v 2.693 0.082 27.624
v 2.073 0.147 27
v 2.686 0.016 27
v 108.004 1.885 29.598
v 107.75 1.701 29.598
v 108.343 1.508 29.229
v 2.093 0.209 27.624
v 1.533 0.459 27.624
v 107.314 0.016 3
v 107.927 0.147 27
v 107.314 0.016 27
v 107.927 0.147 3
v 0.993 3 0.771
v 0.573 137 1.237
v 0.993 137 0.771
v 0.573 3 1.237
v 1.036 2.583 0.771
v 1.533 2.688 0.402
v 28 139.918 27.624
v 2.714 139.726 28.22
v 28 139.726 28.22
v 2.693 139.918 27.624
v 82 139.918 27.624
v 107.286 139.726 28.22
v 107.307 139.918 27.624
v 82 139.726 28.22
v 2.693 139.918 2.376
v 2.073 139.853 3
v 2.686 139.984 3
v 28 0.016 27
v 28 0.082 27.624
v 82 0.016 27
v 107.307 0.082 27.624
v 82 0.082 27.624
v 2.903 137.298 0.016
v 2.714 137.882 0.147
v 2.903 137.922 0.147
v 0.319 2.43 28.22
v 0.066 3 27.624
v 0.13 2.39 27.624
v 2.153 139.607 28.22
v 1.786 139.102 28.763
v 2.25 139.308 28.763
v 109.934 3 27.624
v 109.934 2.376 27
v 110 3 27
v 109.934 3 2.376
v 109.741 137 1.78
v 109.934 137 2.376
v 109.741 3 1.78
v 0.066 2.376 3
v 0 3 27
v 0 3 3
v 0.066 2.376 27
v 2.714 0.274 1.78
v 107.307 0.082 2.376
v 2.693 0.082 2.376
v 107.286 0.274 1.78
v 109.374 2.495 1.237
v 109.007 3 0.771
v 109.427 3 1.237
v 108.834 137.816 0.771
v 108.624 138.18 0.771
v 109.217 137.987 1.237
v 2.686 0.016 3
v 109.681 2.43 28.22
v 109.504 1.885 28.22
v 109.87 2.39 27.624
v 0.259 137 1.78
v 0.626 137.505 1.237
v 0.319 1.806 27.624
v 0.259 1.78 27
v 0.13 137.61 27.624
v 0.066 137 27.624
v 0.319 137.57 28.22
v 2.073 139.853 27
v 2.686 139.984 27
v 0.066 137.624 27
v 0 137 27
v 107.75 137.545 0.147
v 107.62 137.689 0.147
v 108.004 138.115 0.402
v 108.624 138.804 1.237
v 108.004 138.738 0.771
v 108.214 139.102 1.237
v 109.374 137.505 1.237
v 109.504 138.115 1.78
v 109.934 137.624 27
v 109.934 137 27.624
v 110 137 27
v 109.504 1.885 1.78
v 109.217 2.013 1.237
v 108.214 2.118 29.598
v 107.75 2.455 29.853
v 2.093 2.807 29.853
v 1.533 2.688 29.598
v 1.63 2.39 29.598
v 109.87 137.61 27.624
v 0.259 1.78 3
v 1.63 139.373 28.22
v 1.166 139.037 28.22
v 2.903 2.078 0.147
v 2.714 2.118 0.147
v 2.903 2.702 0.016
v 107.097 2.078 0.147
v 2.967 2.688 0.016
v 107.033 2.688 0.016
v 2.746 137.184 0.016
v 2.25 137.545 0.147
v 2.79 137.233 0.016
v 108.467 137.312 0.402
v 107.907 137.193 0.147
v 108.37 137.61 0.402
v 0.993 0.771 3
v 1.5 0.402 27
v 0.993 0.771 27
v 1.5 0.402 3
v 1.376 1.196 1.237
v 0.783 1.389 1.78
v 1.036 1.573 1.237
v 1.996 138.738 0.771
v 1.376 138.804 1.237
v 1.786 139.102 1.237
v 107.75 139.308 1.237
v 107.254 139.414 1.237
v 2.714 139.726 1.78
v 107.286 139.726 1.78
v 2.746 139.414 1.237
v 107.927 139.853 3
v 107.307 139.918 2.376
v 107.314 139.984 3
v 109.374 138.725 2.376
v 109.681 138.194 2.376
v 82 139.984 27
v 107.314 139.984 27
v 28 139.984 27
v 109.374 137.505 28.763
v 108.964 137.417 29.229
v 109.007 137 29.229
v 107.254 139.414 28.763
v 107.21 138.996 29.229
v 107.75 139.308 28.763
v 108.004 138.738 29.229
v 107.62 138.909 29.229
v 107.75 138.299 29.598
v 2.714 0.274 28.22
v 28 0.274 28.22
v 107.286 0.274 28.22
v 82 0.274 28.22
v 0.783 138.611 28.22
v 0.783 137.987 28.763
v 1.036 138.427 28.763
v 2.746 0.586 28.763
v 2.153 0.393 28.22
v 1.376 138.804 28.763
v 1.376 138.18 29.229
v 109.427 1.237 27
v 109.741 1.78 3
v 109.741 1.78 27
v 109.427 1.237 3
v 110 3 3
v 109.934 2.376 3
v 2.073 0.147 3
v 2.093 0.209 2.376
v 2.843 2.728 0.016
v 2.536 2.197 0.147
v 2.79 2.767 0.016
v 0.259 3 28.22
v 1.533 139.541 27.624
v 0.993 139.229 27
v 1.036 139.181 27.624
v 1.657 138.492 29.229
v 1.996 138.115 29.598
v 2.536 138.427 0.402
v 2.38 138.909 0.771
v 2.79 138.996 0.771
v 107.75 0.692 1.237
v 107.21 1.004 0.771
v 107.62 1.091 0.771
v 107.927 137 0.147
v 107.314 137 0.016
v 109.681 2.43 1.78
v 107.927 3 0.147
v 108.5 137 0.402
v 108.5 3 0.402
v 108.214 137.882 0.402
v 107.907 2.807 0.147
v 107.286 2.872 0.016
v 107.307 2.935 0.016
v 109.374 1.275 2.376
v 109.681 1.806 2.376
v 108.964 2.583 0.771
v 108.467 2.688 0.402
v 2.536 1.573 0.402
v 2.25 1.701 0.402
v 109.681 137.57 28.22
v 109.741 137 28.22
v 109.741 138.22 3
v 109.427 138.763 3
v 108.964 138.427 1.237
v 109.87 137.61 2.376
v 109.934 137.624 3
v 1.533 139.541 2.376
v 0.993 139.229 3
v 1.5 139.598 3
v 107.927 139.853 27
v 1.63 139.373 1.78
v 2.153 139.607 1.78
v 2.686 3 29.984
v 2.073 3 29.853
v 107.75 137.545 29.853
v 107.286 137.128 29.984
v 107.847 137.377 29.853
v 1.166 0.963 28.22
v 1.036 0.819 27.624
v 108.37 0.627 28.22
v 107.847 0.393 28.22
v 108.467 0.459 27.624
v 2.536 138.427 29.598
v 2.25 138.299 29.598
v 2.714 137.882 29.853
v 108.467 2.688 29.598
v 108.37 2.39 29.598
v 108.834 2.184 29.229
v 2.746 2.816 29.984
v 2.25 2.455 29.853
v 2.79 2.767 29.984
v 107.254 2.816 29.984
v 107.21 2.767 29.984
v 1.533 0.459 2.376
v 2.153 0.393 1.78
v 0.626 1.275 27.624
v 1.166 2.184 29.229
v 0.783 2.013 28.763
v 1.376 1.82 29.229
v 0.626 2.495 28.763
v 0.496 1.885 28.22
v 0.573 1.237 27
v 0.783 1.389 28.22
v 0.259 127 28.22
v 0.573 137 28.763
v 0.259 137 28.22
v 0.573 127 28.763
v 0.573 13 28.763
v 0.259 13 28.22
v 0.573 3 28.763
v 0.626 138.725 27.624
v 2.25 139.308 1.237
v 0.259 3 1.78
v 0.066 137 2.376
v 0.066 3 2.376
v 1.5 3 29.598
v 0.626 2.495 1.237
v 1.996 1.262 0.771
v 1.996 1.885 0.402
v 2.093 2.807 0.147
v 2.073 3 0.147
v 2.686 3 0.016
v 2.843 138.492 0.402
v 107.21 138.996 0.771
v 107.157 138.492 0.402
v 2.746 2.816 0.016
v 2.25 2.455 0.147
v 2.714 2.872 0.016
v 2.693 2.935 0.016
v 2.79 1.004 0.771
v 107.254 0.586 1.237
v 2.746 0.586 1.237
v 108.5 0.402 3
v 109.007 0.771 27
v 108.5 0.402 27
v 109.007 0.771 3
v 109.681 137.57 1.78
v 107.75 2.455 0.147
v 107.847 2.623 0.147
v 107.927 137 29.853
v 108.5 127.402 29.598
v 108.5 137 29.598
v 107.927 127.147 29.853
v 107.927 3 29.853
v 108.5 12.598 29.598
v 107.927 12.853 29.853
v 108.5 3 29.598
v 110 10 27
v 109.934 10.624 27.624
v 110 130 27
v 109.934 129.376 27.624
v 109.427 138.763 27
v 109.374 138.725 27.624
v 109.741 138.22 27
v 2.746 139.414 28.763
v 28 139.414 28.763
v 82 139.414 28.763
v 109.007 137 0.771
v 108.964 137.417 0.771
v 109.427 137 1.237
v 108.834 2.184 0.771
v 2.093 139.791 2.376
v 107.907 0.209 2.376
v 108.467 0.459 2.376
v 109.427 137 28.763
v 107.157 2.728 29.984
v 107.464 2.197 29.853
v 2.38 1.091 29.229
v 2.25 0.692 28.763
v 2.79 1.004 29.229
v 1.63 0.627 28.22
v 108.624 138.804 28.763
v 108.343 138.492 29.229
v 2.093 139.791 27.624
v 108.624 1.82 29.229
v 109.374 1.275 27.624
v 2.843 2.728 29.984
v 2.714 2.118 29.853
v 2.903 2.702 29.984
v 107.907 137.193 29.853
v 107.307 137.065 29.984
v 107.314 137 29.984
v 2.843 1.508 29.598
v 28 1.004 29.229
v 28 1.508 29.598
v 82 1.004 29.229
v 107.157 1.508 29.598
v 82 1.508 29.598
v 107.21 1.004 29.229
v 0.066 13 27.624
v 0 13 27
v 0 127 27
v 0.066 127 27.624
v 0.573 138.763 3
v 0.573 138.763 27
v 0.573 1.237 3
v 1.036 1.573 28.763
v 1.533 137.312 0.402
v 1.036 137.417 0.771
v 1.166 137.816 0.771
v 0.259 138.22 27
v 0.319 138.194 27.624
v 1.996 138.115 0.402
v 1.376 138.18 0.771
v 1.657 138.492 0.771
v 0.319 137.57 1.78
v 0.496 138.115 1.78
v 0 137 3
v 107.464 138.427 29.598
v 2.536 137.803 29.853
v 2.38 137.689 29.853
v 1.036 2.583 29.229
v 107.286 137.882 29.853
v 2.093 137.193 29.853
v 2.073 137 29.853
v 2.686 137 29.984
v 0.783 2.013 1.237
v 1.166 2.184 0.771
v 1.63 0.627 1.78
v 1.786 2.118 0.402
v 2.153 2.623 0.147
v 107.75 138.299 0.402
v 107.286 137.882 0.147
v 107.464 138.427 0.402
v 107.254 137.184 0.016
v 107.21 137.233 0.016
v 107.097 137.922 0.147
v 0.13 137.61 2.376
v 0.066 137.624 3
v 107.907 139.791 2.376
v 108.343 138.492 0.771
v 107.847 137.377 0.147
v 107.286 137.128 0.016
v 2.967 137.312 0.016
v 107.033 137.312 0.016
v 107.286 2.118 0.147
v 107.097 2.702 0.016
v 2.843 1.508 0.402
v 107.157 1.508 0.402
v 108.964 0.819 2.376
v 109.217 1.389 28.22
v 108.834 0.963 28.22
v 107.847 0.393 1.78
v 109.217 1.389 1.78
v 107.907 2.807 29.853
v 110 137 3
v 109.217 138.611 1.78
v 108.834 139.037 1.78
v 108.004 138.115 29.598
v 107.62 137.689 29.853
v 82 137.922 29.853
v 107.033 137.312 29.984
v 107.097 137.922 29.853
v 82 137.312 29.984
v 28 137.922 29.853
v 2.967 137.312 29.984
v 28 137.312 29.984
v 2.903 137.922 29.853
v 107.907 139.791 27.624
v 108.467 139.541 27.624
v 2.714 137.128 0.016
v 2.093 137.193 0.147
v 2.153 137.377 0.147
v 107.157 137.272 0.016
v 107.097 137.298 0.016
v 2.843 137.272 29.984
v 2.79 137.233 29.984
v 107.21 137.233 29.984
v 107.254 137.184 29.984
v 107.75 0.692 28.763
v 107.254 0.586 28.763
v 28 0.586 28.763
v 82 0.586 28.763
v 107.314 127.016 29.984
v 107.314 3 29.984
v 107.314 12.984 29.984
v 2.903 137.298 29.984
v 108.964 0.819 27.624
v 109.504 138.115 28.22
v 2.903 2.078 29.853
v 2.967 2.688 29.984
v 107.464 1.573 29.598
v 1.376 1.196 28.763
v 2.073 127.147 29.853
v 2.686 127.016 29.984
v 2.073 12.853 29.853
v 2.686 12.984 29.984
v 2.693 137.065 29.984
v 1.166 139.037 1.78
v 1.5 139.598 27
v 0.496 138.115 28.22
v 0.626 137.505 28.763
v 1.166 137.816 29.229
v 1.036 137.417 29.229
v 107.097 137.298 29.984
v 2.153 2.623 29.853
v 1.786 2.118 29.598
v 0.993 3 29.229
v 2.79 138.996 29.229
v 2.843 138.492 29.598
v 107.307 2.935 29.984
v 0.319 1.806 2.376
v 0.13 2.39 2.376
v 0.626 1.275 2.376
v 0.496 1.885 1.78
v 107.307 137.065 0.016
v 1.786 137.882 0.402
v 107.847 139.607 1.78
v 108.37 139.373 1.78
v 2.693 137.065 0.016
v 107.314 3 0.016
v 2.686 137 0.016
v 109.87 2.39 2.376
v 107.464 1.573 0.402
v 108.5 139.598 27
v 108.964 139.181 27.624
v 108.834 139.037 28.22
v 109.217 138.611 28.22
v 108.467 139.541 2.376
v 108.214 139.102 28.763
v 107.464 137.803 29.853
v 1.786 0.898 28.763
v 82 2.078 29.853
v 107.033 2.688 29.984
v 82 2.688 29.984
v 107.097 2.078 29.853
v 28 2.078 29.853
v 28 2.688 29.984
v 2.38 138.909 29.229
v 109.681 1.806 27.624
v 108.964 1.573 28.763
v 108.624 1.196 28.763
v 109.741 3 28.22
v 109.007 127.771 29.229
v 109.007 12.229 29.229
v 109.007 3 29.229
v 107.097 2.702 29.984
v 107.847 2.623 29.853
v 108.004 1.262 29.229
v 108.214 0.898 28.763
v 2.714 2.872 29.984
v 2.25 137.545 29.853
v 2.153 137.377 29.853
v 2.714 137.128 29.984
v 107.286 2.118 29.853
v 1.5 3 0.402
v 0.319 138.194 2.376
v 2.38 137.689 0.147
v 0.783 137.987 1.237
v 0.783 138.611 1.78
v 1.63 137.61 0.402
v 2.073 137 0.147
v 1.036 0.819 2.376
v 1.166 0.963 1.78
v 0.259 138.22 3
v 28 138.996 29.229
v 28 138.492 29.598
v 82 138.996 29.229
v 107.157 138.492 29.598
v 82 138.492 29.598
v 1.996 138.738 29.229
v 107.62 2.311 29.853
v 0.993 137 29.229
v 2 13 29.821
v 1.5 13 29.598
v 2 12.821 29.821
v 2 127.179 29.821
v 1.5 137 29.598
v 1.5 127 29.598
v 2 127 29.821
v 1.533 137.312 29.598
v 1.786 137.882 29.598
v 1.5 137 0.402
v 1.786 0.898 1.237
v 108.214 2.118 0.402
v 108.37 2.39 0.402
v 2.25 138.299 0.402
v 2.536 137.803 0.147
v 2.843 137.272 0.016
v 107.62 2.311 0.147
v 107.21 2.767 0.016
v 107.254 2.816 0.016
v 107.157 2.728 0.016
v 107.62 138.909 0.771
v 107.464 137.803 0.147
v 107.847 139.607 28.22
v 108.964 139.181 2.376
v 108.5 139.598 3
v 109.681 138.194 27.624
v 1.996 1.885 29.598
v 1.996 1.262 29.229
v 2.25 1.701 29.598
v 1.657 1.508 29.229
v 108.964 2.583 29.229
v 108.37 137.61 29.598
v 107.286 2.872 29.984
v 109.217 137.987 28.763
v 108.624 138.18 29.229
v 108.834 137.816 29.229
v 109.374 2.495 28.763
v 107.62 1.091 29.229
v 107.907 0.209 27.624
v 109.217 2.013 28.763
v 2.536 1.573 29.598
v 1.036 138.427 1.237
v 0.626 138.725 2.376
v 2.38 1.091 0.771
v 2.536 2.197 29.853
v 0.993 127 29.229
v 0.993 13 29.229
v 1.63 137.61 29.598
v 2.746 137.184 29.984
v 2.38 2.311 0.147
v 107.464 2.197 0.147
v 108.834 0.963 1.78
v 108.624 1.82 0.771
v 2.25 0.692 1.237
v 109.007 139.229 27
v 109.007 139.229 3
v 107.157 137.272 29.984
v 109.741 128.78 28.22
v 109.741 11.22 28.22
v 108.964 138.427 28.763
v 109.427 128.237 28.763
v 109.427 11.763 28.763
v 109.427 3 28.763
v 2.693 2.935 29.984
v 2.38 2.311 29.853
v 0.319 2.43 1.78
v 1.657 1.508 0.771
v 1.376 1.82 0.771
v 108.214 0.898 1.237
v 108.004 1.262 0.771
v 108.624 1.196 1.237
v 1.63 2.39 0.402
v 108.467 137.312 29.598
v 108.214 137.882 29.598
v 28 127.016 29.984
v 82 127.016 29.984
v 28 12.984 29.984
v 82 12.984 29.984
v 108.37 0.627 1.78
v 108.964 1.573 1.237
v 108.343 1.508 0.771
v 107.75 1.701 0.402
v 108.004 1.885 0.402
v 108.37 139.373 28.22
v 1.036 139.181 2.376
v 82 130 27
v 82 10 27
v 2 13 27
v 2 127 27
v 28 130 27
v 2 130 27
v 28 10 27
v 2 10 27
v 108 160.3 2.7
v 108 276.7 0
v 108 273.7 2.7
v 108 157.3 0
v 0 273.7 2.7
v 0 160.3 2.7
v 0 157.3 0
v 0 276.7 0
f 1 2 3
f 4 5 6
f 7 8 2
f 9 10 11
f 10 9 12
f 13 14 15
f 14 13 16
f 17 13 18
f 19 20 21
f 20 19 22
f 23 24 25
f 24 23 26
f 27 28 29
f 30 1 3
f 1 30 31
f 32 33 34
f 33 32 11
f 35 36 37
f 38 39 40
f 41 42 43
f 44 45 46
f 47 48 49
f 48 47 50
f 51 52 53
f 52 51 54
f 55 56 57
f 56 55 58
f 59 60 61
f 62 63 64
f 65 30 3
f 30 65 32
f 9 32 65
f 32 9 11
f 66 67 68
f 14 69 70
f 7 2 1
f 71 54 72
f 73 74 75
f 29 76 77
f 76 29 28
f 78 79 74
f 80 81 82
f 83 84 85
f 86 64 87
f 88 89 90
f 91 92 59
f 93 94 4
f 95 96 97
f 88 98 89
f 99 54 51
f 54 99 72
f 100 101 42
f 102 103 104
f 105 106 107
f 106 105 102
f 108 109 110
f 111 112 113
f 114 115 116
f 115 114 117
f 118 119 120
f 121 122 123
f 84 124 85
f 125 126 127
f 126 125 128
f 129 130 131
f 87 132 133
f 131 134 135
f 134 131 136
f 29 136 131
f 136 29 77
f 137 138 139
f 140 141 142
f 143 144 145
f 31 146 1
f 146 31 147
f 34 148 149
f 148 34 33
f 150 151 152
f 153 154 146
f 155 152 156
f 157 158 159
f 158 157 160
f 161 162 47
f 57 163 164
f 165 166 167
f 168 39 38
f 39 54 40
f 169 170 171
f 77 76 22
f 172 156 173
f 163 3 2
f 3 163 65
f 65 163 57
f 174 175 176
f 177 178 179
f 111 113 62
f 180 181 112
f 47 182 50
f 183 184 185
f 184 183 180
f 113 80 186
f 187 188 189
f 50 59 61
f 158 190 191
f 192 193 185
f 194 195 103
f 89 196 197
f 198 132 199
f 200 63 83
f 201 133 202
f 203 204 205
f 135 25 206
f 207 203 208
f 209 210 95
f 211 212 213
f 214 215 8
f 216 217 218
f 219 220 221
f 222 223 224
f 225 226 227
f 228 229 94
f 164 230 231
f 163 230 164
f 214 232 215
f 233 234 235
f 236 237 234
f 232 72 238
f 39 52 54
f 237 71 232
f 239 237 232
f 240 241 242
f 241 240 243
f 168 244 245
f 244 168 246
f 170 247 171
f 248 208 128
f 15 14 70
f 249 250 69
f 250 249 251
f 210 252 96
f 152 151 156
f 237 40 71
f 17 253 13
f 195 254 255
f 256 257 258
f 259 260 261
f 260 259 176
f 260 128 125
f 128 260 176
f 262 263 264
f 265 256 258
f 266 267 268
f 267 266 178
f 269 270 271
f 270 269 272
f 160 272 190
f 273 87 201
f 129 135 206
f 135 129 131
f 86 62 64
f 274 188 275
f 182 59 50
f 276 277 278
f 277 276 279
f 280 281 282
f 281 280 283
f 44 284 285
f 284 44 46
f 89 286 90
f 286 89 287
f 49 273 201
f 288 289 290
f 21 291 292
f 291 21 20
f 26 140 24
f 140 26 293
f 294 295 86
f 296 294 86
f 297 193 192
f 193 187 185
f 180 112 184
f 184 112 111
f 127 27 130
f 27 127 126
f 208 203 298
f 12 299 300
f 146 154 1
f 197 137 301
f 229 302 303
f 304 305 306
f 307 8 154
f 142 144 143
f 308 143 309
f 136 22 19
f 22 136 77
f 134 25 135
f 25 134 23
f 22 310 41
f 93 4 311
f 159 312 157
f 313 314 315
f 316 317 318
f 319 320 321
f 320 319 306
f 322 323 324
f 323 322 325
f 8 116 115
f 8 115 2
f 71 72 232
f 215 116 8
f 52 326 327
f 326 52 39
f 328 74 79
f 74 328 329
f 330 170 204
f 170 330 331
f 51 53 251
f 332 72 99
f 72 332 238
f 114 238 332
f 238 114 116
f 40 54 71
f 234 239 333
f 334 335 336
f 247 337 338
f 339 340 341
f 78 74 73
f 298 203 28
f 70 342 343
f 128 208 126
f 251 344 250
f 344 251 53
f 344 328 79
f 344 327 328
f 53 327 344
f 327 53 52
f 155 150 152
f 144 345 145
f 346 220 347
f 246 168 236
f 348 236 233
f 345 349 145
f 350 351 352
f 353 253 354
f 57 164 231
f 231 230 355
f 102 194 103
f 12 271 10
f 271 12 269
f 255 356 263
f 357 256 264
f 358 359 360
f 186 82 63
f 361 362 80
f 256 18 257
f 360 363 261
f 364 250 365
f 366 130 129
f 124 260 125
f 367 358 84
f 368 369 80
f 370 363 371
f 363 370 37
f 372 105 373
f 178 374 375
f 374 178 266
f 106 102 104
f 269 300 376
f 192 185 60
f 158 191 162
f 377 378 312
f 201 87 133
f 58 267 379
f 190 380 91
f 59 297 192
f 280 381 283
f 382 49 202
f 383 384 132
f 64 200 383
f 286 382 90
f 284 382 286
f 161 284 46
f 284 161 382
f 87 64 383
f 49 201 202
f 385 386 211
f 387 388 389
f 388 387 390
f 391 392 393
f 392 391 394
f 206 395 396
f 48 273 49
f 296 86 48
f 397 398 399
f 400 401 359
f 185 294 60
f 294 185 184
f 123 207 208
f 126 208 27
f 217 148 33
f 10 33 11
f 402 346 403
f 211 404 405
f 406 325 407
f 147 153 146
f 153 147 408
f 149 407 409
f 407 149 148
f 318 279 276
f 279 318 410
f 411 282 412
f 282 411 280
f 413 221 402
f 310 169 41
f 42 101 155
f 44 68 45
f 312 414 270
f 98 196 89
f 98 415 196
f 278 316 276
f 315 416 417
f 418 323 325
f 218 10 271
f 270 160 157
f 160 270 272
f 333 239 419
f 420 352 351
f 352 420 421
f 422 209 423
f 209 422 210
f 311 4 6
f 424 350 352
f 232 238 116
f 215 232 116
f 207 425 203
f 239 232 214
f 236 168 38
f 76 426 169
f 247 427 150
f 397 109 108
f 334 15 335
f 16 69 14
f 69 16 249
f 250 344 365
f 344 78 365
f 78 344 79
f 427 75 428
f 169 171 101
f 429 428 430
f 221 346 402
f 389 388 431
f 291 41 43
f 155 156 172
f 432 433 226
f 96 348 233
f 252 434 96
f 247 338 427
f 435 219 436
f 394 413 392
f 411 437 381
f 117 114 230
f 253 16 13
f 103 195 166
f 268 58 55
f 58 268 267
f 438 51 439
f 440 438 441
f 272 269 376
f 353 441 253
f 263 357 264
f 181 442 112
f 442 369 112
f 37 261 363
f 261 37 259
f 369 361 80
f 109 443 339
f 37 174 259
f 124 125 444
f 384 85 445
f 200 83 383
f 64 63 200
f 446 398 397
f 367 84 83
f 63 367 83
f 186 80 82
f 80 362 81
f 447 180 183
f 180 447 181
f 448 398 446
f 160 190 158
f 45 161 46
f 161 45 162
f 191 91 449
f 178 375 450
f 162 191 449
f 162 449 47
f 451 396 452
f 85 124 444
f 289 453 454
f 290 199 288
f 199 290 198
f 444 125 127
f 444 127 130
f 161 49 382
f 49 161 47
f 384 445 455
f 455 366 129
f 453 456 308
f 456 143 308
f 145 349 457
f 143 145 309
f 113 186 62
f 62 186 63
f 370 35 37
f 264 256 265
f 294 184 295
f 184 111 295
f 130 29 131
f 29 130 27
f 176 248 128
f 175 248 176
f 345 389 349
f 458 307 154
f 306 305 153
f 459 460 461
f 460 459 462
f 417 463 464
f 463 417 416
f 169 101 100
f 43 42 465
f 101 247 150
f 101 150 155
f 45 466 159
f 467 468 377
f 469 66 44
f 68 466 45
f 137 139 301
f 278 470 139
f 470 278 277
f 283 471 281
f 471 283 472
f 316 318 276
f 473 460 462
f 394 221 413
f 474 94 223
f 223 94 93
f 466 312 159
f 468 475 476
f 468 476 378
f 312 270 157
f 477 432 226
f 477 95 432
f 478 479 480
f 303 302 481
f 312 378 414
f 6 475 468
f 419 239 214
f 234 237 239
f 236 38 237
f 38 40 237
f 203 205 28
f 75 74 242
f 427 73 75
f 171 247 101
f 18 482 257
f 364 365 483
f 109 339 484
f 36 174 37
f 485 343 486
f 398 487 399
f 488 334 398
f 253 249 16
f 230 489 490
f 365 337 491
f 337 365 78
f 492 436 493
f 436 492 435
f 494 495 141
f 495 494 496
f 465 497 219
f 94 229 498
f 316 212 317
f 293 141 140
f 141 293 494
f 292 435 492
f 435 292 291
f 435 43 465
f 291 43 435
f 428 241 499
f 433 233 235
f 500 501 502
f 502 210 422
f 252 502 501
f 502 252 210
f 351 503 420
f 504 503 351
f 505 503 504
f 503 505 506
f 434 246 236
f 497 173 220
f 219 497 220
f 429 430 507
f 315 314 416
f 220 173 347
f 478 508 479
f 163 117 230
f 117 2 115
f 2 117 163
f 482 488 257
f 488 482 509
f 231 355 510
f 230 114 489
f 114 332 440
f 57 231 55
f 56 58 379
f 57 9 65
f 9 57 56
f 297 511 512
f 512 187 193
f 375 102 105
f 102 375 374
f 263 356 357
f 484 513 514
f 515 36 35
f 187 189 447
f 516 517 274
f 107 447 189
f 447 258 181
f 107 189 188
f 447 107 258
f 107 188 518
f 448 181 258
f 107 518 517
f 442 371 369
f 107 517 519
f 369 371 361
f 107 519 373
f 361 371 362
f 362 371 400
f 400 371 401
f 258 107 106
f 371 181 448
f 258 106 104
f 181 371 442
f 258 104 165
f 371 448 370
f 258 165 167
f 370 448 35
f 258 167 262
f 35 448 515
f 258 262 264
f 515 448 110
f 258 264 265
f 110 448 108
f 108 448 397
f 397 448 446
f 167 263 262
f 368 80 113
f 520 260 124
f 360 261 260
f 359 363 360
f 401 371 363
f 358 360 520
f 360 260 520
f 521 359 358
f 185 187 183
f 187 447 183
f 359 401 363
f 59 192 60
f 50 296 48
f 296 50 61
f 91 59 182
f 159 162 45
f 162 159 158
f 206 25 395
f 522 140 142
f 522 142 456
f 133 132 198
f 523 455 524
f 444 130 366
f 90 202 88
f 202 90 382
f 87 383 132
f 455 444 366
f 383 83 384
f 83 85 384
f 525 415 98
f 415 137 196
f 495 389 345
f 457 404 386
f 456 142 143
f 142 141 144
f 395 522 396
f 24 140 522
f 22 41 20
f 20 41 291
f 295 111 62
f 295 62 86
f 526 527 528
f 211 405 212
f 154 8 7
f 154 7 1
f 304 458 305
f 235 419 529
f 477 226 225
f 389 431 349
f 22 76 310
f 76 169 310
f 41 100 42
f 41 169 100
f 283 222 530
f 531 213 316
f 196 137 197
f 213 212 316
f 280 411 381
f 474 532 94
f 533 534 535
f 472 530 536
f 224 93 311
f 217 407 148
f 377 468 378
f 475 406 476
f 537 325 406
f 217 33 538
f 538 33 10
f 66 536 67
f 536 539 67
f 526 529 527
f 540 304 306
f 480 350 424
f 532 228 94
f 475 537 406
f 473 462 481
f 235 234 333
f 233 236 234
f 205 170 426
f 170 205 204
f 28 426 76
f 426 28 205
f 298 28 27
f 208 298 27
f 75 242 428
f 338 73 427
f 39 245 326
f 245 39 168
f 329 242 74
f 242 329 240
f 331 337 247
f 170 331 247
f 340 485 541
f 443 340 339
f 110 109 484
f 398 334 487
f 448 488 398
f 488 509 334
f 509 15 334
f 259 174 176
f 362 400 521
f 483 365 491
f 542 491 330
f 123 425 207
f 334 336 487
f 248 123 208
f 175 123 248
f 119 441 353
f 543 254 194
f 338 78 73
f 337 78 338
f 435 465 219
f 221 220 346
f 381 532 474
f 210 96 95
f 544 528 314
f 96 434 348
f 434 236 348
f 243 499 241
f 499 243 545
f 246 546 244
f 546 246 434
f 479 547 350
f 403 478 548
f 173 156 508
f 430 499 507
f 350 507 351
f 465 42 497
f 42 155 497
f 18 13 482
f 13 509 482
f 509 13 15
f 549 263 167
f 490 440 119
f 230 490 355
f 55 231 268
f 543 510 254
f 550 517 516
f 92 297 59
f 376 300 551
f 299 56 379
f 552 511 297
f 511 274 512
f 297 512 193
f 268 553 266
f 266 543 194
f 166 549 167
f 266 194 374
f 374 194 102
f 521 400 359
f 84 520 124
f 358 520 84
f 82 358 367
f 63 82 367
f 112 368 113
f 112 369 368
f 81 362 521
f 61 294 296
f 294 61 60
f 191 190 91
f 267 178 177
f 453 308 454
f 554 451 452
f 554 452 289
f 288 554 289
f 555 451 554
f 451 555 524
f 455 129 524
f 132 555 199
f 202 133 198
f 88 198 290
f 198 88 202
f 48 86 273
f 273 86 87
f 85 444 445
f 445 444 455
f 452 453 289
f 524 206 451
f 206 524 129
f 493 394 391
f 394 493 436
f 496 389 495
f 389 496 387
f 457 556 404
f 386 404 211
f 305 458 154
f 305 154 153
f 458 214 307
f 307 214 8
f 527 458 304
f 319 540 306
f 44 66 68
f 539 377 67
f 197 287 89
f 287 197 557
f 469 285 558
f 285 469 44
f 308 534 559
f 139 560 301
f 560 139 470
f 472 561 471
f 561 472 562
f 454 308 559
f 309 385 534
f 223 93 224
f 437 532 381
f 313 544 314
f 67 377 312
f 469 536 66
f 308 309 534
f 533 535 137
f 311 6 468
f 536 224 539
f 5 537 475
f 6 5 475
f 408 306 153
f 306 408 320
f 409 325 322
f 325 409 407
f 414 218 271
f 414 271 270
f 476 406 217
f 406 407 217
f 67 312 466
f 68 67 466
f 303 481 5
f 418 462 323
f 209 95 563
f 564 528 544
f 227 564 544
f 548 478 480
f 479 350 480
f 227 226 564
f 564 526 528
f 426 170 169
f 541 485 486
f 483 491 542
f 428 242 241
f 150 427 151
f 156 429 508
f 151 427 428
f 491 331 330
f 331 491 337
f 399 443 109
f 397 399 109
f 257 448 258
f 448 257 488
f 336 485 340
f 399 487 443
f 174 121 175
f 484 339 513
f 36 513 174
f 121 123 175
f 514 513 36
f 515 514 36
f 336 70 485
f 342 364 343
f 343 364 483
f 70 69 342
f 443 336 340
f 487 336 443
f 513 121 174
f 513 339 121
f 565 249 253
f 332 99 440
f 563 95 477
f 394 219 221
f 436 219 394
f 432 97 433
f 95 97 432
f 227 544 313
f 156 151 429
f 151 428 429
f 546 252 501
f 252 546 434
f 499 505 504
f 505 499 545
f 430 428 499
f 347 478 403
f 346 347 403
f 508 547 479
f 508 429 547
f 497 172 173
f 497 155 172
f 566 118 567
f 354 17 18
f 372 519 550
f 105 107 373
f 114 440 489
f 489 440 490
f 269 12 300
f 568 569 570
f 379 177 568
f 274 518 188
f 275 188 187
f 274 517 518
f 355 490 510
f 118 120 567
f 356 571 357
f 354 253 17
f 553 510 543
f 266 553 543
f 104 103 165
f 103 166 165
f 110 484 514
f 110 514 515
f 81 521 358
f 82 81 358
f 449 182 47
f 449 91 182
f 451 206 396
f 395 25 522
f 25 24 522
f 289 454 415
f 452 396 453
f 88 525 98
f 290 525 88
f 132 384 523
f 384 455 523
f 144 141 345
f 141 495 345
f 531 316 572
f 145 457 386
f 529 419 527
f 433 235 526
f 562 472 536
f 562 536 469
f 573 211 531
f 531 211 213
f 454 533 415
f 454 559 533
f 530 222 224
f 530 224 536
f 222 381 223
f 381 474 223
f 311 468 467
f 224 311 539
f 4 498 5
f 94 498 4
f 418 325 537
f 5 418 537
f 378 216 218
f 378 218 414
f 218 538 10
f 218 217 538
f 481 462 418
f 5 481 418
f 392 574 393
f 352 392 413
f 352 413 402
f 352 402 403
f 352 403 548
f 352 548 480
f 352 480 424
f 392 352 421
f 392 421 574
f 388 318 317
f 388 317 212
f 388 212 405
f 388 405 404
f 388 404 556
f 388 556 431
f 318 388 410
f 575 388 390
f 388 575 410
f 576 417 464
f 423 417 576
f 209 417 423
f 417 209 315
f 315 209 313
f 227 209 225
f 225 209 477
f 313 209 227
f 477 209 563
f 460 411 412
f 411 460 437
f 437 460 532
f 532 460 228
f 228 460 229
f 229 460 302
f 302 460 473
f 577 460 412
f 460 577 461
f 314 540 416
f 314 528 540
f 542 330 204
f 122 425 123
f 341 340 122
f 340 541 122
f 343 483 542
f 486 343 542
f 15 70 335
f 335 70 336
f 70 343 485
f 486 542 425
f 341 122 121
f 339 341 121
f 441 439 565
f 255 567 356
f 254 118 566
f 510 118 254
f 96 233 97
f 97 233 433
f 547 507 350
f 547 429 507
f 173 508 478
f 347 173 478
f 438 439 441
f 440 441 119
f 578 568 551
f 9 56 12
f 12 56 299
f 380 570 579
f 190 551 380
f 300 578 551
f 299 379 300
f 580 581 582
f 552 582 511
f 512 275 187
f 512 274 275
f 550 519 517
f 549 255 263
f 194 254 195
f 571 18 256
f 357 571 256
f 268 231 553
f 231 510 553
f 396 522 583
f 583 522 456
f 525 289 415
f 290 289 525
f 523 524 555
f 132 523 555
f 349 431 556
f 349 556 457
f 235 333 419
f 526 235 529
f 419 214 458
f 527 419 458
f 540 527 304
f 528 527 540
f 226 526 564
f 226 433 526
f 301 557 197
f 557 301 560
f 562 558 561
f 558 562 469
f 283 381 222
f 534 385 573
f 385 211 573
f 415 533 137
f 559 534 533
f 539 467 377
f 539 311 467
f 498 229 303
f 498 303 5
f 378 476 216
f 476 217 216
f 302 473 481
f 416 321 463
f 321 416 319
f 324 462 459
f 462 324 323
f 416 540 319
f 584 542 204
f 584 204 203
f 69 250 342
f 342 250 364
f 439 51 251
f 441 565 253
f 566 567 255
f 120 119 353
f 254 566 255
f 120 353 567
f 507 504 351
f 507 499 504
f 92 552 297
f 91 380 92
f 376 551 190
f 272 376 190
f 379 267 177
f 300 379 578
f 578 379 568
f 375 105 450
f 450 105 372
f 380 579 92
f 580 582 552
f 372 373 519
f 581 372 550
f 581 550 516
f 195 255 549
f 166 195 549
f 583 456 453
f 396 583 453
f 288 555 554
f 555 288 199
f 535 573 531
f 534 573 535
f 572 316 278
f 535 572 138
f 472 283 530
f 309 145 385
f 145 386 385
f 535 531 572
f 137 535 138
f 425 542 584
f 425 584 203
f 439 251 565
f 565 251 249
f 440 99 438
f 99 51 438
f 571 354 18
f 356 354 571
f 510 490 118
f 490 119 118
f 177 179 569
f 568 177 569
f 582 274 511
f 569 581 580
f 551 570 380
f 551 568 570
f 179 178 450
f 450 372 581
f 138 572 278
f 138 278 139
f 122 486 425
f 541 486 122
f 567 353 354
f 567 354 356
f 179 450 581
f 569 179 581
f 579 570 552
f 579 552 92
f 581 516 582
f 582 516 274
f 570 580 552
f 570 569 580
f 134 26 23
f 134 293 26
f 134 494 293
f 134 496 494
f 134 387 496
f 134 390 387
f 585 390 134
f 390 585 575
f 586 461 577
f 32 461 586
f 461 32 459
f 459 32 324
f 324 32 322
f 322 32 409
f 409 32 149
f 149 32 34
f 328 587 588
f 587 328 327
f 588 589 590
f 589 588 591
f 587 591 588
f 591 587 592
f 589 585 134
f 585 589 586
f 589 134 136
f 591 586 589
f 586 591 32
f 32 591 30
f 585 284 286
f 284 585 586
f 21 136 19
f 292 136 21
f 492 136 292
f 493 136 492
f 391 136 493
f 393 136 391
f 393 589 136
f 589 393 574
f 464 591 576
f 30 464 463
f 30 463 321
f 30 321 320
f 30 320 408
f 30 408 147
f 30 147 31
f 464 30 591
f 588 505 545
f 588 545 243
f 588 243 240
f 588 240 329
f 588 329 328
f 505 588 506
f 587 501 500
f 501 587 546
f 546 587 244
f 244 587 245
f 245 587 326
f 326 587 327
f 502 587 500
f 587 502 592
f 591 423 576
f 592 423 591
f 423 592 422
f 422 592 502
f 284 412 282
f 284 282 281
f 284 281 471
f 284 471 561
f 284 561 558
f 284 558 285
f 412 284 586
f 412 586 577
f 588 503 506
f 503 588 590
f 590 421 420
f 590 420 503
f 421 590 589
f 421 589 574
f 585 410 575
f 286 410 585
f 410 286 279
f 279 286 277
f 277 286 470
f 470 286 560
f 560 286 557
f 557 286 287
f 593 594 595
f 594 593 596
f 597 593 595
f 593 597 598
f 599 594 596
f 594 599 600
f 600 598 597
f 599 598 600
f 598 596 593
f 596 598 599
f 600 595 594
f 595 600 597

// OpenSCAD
$fn = 30;

TL = 110;
TW = 140;
TH = 27;
LidH = 3;

WT = 2;

Tol =0.3;


module RCube(x,y,z,ipR=2, ipFlatTop = 0)
{
    hull(){
      translate([ipR,ipR,ipR]) sphere(ipR);
      translate([x-ipR,ipR,ipR]) sphere(ipR);
      translate([ipR,y-ipR,ipR]) sphere(ipR);
      translate([x-ipR,y-ipR,ipR]) sphere(ipR);
      if (ipFlatTop > 0)
        {
          translate([ipR,ipR,z-ipR]) cylinder(r=ipR,h=ipR);
          translate([x-ipR,ipR,z-ipR]) cylinder(r=ipR,h=ipR);
          translate([ipR,y-ipR,z-ipR]) cylinder(r=ipR,h=ipR);
          translate([x-ipR,y-ipR,z-ipR]) cylinder(r=ipR,h=ipR);
        }
        else
        {  
          translate([ipR,ipR,z-ipR]) sphere(ipR);
          translate([x-ipR,ipR,z-ipR]) sphere(ipR);
          translate([ipR,y-ipR,z-ipR]) sphere(ipR);
          translate([x-ipR,y-ipR,z-ipR]) sphere(ipR);
        }
    }   
} 

module lid(){
    
  translate([0,Tol,0])  cube([TL-2,TW-26-Tol*2,LidH-Tol]);
  translate([0,0-3+Tol,LidH]) rotate([0,90,0]) linear_extrude(TL-2) polygon([[LidH,0],[LidH,LidH],[Tol,LidH]], paths=[[0,1,2]]);
  translate([0,TW-26-Tol,LidH]) rotate([0,90,0]) linear_extrude(TL-2) polygon([[Tol,0],[LidH,0],[LidH,LidH]], paths=[[0,1,2]]);


}

module Box() 
{
difference()
{
   RCube(TL, TW, TH+LidH, ipR =3, ipFlatTop=true);

    
   // rails for lid 
   translate([28, 0, TH]) cube([TL-56, TW, LidH]);
   translate([0, 13, TH]) cube([TL, TW-26, LidH]);
  translate([2,13-3,TH+3]) rotate([0,90,0]) linear_extrude(TL) polygon([[LidH,0],[LidH,LidH],[0,LidH]], paths=[[0,1,2]]);
  translate([2,TW-13,TH+3]) rotate([0,90,0]) linear_extrude(TL) polygon([[0,0],[LidH,0],[LidH,LidH]], paths=[[0,1,2]]);


   
}
}

Box();
   // Lid
translate([0,TW+20,0]) lid();
